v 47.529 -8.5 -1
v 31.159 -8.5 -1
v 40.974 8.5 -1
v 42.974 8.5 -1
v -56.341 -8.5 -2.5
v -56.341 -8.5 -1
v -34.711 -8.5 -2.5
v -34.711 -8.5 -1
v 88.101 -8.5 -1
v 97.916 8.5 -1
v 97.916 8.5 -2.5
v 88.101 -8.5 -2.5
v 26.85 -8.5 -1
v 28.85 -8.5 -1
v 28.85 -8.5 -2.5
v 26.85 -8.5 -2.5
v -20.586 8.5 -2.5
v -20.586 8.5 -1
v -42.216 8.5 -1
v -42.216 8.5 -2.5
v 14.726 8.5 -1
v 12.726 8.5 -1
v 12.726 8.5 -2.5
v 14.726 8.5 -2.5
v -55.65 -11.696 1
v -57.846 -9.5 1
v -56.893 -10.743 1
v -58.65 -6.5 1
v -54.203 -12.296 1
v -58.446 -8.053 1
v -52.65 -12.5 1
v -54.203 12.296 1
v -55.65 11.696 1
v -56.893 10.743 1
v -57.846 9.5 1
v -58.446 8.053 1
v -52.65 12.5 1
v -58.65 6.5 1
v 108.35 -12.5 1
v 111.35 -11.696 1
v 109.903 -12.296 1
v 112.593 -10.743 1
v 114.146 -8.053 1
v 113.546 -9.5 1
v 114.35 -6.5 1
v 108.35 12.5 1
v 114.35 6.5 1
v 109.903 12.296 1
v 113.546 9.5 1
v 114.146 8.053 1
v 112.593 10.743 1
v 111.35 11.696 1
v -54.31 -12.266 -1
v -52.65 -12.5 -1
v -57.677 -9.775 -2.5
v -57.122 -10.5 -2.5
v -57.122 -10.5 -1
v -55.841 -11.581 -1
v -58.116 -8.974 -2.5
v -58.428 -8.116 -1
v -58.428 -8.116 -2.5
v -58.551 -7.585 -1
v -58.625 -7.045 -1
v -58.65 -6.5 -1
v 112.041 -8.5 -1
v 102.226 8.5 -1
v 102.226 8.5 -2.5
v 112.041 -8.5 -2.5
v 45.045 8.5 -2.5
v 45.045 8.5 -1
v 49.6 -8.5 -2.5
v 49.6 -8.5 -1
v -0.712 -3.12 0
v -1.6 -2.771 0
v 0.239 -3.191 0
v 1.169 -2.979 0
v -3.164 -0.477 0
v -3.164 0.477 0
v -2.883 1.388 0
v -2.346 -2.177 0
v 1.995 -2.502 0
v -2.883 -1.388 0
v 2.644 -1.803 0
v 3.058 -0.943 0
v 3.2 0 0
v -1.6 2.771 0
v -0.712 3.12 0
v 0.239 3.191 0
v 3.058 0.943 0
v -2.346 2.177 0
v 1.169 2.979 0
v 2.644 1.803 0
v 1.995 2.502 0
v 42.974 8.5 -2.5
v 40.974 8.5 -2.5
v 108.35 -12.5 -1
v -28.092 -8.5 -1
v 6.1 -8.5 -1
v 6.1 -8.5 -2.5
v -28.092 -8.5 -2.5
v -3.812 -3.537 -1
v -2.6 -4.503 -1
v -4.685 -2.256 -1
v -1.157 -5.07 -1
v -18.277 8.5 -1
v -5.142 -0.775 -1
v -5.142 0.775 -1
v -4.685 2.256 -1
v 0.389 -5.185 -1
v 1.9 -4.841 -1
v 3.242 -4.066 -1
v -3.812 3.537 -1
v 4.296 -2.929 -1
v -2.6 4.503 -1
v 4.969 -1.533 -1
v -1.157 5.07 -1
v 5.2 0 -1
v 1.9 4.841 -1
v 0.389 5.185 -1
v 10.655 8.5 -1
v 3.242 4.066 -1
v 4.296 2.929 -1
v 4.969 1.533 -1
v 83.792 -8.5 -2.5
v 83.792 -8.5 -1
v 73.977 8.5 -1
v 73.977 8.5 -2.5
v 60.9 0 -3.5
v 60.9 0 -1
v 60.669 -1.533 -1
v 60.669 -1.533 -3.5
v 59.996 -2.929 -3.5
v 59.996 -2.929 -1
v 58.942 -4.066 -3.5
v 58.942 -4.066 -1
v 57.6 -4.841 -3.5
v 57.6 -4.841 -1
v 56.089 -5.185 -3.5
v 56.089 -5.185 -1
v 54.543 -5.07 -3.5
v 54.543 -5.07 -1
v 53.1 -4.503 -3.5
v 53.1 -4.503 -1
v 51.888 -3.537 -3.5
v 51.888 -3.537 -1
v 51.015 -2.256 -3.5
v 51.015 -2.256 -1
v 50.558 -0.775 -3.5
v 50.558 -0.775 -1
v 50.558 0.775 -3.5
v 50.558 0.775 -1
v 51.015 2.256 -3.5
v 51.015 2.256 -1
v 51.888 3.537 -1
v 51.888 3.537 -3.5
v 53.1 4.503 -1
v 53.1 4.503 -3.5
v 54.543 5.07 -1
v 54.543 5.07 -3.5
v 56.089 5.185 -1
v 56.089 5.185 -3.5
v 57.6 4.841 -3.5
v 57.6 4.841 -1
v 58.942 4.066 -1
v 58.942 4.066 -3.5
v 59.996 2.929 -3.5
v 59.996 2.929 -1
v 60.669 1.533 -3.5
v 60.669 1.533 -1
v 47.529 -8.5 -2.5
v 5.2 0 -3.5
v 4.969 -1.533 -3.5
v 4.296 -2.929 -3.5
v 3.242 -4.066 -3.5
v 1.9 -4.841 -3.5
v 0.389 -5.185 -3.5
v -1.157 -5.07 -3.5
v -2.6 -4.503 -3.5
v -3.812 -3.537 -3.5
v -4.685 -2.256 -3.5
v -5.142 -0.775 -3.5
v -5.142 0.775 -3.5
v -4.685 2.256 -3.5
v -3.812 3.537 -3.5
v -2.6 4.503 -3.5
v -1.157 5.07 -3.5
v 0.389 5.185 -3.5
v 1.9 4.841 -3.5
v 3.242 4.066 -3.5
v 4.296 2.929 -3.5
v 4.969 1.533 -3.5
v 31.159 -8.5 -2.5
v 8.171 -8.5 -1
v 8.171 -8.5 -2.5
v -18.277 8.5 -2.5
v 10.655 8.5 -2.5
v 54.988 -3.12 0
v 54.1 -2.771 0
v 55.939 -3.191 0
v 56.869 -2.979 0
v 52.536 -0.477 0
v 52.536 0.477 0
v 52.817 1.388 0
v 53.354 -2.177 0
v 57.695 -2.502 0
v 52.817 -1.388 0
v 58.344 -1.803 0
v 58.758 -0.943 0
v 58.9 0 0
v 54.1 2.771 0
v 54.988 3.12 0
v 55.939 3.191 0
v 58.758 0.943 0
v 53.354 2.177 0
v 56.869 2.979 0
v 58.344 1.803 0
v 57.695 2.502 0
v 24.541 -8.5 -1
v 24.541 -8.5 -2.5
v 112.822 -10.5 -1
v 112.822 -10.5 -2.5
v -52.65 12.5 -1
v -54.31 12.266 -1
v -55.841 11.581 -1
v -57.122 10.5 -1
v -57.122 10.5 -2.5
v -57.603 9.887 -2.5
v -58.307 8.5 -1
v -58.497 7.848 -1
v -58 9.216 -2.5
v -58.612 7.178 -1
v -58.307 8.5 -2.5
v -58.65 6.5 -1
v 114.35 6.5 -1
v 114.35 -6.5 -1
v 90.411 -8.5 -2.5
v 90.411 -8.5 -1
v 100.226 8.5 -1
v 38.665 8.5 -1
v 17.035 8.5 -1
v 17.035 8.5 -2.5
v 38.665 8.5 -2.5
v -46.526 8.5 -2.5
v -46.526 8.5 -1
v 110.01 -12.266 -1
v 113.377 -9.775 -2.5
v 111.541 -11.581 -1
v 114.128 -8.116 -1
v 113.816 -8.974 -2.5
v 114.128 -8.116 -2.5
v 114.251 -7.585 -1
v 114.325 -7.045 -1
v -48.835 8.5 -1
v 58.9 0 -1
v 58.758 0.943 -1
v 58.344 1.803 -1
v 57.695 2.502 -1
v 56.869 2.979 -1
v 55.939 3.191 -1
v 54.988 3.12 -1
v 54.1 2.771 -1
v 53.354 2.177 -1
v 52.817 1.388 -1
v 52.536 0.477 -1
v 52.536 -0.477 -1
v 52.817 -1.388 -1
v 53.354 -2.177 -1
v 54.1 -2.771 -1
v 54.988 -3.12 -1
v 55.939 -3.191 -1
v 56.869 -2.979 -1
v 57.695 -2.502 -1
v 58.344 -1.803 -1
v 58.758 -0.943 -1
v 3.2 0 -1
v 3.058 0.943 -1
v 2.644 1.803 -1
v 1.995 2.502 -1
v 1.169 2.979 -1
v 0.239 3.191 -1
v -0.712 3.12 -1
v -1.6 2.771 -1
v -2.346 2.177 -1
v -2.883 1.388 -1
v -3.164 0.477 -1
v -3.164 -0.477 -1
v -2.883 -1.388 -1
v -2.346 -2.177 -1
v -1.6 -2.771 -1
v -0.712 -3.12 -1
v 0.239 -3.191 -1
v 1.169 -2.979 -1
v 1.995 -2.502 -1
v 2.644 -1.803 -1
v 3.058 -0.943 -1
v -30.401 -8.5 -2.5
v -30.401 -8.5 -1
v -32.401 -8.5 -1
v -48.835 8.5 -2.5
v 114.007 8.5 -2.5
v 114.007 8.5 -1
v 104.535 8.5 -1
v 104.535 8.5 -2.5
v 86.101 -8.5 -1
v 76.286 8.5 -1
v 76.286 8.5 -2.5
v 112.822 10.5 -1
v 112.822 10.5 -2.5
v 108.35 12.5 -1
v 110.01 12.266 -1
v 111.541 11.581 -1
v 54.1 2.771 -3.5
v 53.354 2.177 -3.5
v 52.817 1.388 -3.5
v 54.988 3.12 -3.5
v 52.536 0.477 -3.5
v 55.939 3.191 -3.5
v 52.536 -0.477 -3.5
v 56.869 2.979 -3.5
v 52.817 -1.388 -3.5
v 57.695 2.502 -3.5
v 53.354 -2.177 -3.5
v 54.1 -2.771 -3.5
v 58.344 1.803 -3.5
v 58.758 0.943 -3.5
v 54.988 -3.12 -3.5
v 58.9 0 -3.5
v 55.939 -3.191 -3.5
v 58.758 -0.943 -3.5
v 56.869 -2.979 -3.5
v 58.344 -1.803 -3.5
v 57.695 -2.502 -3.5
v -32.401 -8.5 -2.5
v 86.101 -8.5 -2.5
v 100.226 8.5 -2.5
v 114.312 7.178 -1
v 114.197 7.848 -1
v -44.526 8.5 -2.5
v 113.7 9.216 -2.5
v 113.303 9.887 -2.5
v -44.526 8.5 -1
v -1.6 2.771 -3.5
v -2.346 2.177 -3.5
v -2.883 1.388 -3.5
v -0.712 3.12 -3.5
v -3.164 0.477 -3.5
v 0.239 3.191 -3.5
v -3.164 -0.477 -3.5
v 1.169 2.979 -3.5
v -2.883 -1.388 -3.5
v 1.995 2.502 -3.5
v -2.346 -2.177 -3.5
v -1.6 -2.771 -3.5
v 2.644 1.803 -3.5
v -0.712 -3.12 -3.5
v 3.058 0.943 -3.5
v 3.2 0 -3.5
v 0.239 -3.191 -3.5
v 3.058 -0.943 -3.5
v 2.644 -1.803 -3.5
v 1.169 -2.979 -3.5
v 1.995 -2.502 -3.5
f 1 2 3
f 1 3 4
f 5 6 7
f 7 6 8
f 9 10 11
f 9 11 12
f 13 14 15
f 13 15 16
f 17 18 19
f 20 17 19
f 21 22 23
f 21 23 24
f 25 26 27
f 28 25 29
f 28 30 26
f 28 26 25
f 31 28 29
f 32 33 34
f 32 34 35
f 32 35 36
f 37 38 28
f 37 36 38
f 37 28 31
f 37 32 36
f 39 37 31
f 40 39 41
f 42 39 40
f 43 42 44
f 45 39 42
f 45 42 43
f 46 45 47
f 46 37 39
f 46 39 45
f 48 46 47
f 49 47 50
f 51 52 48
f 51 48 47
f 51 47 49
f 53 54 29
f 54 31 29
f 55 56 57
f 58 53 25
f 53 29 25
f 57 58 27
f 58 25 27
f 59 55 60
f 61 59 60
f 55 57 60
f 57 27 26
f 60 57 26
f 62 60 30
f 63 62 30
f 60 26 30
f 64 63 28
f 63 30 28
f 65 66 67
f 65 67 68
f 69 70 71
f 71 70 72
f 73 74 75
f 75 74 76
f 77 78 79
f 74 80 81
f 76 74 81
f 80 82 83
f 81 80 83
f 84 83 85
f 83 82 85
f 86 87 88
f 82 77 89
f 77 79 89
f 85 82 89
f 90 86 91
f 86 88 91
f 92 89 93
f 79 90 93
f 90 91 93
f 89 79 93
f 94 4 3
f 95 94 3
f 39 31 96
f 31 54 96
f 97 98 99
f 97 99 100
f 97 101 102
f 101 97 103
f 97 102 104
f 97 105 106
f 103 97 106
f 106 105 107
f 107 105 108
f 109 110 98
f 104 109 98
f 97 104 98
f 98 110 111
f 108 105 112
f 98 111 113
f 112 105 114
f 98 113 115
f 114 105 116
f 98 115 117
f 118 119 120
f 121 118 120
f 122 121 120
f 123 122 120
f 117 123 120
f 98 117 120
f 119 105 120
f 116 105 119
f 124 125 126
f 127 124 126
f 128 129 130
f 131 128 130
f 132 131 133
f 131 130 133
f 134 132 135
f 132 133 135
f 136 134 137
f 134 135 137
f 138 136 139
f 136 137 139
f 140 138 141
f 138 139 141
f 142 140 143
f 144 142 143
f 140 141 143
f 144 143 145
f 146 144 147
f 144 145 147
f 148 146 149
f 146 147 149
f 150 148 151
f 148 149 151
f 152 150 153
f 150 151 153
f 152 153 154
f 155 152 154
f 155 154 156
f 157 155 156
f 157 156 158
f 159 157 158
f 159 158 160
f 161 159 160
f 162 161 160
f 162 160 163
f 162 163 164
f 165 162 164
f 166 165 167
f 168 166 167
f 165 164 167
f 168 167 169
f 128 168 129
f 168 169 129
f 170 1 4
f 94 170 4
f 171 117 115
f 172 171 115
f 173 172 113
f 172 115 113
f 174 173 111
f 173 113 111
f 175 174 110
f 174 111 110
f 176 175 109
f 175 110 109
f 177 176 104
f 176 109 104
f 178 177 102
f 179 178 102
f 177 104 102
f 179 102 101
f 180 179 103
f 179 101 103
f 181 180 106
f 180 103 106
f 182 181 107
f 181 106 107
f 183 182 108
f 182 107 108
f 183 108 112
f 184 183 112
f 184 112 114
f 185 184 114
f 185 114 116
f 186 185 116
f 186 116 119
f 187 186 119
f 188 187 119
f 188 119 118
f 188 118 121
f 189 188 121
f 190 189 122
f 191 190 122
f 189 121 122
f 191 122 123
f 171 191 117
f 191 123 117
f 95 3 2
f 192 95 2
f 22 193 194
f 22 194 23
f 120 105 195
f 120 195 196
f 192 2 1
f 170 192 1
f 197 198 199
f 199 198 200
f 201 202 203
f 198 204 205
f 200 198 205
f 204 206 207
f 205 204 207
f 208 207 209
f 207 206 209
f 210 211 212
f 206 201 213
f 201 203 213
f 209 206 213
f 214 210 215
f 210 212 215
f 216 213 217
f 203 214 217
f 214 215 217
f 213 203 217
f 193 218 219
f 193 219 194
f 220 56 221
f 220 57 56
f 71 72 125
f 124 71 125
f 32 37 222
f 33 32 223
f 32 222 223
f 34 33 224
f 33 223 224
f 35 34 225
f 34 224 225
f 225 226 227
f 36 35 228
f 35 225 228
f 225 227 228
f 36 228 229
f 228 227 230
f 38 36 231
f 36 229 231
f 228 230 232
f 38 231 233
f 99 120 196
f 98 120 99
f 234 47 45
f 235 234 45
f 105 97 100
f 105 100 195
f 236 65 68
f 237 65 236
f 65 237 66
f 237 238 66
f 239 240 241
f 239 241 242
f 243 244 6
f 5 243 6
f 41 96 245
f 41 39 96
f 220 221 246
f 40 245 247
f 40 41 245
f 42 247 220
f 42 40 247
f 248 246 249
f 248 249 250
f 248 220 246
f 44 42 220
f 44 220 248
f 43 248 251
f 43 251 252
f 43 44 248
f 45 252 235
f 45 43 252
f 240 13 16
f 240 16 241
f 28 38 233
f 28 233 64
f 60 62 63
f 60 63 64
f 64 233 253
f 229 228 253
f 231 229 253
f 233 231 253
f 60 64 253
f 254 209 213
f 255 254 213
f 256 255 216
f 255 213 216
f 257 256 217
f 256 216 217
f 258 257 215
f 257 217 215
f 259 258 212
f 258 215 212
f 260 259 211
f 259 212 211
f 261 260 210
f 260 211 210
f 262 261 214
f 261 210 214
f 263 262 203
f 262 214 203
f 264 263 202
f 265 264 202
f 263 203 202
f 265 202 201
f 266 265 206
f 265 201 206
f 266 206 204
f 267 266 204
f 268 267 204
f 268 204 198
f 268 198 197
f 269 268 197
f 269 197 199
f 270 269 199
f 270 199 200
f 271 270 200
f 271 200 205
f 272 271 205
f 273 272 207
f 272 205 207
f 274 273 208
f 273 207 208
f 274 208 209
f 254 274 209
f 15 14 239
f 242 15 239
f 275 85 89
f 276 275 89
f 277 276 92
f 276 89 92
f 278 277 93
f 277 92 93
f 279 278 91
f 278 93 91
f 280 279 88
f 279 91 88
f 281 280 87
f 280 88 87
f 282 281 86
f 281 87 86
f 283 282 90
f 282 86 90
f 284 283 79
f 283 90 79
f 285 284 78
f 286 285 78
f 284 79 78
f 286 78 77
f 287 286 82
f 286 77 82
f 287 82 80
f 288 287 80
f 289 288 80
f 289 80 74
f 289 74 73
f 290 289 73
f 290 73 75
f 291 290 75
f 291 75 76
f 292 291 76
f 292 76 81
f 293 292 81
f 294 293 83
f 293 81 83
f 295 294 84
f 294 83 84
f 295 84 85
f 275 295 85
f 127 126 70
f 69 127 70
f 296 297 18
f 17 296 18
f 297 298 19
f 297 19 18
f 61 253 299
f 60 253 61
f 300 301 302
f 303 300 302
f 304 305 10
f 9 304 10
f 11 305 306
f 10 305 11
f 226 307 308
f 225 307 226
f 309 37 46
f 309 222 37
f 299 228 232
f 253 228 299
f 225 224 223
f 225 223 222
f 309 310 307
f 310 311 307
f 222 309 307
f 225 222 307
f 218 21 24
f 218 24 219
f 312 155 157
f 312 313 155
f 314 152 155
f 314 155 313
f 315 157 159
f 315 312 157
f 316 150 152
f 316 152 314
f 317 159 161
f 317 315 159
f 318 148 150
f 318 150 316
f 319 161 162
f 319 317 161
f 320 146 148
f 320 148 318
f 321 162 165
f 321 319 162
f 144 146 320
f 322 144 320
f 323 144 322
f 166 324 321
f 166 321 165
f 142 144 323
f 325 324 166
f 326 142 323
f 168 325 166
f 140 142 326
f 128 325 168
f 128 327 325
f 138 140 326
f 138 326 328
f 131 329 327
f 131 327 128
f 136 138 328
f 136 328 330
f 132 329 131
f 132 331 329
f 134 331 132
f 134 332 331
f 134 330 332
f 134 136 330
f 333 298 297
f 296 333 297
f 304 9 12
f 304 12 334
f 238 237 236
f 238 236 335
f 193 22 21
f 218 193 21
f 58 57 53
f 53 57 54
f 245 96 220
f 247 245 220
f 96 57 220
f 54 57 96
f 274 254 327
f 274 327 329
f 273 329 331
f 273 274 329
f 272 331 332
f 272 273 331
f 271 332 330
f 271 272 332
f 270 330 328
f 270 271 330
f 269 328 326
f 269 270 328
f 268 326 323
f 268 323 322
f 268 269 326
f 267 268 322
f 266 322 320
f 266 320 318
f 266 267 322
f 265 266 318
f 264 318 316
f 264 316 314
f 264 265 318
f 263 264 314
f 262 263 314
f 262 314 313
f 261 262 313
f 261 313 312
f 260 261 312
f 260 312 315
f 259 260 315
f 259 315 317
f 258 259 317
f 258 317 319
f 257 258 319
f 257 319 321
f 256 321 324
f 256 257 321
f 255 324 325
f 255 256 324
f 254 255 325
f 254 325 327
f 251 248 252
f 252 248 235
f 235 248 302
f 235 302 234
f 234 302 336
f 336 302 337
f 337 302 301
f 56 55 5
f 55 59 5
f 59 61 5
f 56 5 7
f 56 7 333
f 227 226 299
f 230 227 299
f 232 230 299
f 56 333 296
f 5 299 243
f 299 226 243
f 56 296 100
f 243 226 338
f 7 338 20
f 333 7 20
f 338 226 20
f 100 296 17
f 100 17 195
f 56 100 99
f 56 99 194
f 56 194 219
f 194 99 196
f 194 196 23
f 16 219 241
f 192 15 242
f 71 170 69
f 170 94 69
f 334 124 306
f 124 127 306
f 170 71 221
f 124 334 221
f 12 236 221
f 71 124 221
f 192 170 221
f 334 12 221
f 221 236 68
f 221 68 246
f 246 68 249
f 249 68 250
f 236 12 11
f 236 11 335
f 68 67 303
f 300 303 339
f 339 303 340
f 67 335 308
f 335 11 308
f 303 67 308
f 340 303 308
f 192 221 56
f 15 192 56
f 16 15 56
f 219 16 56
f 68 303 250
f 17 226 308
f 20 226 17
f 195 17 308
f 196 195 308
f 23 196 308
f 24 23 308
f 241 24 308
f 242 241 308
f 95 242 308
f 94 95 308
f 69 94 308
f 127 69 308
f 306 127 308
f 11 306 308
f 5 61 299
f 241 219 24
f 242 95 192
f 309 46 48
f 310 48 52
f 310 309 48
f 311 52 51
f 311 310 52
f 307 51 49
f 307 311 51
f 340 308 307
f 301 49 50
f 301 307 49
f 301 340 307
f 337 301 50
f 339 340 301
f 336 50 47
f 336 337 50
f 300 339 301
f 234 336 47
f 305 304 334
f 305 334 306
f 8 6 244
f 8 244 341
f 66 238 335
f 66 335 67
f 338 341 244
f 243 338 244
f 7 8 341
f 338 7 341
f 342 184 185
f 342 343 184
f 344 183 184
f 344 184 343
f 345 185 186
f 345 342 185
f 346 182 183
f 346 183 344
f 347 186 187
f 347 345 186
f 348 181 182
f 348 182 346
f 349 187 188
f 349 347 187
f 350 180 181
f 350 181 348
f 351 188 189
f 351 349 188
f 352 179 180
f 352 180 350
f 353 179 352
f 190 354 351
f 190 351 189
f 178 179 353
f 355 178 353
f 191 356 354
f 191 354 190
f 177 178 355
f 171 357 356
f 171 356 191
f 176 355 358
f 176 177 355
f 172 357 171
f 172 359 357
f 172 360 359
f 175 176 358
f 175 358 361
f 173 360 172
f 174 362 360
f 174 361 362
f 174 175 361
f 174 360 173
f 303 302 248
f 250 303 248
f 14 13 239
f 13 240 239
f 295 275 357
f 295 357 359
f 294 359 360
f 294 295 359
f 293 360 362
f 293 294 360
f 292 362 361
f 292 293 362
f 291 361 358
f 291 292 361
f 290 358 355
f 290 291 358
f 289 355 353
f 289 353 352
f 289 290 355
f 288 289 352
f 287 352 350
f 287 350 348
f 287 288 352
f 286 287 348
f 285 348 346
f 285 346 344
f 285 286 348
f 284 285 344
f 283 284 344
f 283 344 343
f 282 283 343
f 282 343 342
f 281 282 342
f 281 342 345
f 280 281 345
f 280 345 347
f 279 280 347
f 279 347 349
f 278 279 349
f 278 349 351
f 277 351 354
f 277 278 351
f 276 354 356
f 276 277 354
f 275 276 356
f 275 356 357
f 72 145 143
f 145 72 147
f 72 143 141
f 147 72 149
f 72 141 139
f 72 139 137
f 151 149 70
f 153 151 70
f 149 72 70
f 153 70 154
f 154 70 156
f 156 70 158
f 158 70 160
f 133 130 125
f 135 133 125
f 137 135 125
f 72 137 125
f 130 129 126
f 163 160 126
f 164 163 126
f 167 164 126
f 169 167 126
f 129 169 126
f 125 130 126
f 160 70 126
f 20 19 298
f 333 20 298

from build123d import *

# Parameters (mm, degrees)
SKETCH1_W           = 173
SKETCH1_H           = 25
SKETCH1_R           = 3.2
BOSS_EXTRUDE1_DEPTH = 1
SKETCH2_W           = 173
SKETCH2_H           = 25
BOSS_EXTRUDE2_DEPTH = 1
SKETCH6_R           = 5.2
SKETCH6_R_2         = 3.2
BOSS_EXTRUDE5_DEPTH = 2.5
BOSS_EXTRUDE4_DEPTH = 1.5
FILLET1_R           = 6


with BuildPart() as part:
    # Sketch1 → Boss-Extrude1 (new body)
    with BuildSketch(Plane.XY):
        with Locations((27.85, 0)):
            Rectangle(SKETCH1_W, SKETCH1_H)
        Circle(SKETCH1_R, mode=Mode.SUBTRACT)
        with Locations((55.7, 0)):
            Circle(SKETCH1_R, mode=Mode.SUBTRACT)
    extrude(amount=-BOSS_EXTRUDE1_DEPTH)

    # Sketch2 → Boss-Extrude2 (add)
    with BuildSketch(Plane.XY):
        with Locations((27.85, 0)):
            Rectangle(SKETCH2_W, SKETCH2_H)
    extrude(amount=BOSS_EXTRUDE2_DEPTH)

    # Sketch6 → Boss-Extrude5 (add)
    with BuildSketch(Plane(origin=(0, 0, -1), x_dir=(-1, 0, 0), z_dir=(0, 0, -1))):
        with Locations(Location((-55.7, 0, 0), (0, 0, 180))):
            Circle(SKETCH6_R)
        with Locations(Location((-55.7, 0, 0), (0, 0, 180))):
            Circle(SKETCH6_R_2, mode=Mode.SUBTRACT)
        with Locations(Location((0, 0, 0), (0, 0, 180))):
            Circle(SKETCH6_R)
        with Locations(Location((0, 0, 0), (0, 0, 180))):
            Circle(SKETCH6_R_2, mode=Mode.SUBTRACT)
    extrude(amount=BOSS_EXTRUDE5_DEPTH)

    # Sketch5 → Boss-Extrude4 (add)
    with BuildSketch(Plane(origin=(0, 0, -1), x_dir=(-1, 0, 0), z_dir=(0, 0, -1))):
        Polygon((-27.85, -10.5), (-27.85, -8.5), (-28.85, -8.5), (-38.664954576, 8.5), (-27.85, 8.5), (-27.85, 10.5), (-114.35, 10.5), (-114.35, 8.5), (-104.535045424, 8.5), (-114.35, -8.5), (-114.35, -10.5), align=None)
        Polygon((-112.040598923, -8.5), (-90.410689771, -8.5), (-100.225644347, 8.5), (-102.225644347, 8.5), align=None, mode=Mode.SUBTRACT)
        Polygon((-97.91624327, 8.5), (-88.101288694, -8.5), (-86.101288694, -8.5), (-76.286334118, 8.5), align=None, mode=Mode.SUBTRACT)
        Polygon((-83.791887617, -8.5), (-73.976933041, 8.5), (-45.044908014, 8.5), (-49.600044285, -8.5), align=None, mode=Mode.SUBTRACT)
        Polygon((-40.974355653, 8.5), (-31.159401077, -8.5), (-47.529491924, -8.5), (-42.974355653, 8.5), align=None, mode=Mode.SUBTRACT)
    boss_extrude4 = extrude(amount=BOSS_EXTRUDE4_DEPTH)

    # Mirror1: Boss-Extrude4 across plane
    add(boss_extrude4.mirror(Plane(origin=(27.85, 0, 0), x_dir=(0, 0, 1), z_dir=(1, 0, 0))))

    # Fillet1
    fillet1_edges = [part.edges().sort_by_distance(p)[0] for p in [
        (114.35, 12.5, 0),
        (114.35, -12.5, 0),
        (-58.65, -12.5, 0),
        (-58.65, 12.5, 0),
    ]]
    fillet(fillet1_edges, radius=FILLET1_R)


solid = part.part
